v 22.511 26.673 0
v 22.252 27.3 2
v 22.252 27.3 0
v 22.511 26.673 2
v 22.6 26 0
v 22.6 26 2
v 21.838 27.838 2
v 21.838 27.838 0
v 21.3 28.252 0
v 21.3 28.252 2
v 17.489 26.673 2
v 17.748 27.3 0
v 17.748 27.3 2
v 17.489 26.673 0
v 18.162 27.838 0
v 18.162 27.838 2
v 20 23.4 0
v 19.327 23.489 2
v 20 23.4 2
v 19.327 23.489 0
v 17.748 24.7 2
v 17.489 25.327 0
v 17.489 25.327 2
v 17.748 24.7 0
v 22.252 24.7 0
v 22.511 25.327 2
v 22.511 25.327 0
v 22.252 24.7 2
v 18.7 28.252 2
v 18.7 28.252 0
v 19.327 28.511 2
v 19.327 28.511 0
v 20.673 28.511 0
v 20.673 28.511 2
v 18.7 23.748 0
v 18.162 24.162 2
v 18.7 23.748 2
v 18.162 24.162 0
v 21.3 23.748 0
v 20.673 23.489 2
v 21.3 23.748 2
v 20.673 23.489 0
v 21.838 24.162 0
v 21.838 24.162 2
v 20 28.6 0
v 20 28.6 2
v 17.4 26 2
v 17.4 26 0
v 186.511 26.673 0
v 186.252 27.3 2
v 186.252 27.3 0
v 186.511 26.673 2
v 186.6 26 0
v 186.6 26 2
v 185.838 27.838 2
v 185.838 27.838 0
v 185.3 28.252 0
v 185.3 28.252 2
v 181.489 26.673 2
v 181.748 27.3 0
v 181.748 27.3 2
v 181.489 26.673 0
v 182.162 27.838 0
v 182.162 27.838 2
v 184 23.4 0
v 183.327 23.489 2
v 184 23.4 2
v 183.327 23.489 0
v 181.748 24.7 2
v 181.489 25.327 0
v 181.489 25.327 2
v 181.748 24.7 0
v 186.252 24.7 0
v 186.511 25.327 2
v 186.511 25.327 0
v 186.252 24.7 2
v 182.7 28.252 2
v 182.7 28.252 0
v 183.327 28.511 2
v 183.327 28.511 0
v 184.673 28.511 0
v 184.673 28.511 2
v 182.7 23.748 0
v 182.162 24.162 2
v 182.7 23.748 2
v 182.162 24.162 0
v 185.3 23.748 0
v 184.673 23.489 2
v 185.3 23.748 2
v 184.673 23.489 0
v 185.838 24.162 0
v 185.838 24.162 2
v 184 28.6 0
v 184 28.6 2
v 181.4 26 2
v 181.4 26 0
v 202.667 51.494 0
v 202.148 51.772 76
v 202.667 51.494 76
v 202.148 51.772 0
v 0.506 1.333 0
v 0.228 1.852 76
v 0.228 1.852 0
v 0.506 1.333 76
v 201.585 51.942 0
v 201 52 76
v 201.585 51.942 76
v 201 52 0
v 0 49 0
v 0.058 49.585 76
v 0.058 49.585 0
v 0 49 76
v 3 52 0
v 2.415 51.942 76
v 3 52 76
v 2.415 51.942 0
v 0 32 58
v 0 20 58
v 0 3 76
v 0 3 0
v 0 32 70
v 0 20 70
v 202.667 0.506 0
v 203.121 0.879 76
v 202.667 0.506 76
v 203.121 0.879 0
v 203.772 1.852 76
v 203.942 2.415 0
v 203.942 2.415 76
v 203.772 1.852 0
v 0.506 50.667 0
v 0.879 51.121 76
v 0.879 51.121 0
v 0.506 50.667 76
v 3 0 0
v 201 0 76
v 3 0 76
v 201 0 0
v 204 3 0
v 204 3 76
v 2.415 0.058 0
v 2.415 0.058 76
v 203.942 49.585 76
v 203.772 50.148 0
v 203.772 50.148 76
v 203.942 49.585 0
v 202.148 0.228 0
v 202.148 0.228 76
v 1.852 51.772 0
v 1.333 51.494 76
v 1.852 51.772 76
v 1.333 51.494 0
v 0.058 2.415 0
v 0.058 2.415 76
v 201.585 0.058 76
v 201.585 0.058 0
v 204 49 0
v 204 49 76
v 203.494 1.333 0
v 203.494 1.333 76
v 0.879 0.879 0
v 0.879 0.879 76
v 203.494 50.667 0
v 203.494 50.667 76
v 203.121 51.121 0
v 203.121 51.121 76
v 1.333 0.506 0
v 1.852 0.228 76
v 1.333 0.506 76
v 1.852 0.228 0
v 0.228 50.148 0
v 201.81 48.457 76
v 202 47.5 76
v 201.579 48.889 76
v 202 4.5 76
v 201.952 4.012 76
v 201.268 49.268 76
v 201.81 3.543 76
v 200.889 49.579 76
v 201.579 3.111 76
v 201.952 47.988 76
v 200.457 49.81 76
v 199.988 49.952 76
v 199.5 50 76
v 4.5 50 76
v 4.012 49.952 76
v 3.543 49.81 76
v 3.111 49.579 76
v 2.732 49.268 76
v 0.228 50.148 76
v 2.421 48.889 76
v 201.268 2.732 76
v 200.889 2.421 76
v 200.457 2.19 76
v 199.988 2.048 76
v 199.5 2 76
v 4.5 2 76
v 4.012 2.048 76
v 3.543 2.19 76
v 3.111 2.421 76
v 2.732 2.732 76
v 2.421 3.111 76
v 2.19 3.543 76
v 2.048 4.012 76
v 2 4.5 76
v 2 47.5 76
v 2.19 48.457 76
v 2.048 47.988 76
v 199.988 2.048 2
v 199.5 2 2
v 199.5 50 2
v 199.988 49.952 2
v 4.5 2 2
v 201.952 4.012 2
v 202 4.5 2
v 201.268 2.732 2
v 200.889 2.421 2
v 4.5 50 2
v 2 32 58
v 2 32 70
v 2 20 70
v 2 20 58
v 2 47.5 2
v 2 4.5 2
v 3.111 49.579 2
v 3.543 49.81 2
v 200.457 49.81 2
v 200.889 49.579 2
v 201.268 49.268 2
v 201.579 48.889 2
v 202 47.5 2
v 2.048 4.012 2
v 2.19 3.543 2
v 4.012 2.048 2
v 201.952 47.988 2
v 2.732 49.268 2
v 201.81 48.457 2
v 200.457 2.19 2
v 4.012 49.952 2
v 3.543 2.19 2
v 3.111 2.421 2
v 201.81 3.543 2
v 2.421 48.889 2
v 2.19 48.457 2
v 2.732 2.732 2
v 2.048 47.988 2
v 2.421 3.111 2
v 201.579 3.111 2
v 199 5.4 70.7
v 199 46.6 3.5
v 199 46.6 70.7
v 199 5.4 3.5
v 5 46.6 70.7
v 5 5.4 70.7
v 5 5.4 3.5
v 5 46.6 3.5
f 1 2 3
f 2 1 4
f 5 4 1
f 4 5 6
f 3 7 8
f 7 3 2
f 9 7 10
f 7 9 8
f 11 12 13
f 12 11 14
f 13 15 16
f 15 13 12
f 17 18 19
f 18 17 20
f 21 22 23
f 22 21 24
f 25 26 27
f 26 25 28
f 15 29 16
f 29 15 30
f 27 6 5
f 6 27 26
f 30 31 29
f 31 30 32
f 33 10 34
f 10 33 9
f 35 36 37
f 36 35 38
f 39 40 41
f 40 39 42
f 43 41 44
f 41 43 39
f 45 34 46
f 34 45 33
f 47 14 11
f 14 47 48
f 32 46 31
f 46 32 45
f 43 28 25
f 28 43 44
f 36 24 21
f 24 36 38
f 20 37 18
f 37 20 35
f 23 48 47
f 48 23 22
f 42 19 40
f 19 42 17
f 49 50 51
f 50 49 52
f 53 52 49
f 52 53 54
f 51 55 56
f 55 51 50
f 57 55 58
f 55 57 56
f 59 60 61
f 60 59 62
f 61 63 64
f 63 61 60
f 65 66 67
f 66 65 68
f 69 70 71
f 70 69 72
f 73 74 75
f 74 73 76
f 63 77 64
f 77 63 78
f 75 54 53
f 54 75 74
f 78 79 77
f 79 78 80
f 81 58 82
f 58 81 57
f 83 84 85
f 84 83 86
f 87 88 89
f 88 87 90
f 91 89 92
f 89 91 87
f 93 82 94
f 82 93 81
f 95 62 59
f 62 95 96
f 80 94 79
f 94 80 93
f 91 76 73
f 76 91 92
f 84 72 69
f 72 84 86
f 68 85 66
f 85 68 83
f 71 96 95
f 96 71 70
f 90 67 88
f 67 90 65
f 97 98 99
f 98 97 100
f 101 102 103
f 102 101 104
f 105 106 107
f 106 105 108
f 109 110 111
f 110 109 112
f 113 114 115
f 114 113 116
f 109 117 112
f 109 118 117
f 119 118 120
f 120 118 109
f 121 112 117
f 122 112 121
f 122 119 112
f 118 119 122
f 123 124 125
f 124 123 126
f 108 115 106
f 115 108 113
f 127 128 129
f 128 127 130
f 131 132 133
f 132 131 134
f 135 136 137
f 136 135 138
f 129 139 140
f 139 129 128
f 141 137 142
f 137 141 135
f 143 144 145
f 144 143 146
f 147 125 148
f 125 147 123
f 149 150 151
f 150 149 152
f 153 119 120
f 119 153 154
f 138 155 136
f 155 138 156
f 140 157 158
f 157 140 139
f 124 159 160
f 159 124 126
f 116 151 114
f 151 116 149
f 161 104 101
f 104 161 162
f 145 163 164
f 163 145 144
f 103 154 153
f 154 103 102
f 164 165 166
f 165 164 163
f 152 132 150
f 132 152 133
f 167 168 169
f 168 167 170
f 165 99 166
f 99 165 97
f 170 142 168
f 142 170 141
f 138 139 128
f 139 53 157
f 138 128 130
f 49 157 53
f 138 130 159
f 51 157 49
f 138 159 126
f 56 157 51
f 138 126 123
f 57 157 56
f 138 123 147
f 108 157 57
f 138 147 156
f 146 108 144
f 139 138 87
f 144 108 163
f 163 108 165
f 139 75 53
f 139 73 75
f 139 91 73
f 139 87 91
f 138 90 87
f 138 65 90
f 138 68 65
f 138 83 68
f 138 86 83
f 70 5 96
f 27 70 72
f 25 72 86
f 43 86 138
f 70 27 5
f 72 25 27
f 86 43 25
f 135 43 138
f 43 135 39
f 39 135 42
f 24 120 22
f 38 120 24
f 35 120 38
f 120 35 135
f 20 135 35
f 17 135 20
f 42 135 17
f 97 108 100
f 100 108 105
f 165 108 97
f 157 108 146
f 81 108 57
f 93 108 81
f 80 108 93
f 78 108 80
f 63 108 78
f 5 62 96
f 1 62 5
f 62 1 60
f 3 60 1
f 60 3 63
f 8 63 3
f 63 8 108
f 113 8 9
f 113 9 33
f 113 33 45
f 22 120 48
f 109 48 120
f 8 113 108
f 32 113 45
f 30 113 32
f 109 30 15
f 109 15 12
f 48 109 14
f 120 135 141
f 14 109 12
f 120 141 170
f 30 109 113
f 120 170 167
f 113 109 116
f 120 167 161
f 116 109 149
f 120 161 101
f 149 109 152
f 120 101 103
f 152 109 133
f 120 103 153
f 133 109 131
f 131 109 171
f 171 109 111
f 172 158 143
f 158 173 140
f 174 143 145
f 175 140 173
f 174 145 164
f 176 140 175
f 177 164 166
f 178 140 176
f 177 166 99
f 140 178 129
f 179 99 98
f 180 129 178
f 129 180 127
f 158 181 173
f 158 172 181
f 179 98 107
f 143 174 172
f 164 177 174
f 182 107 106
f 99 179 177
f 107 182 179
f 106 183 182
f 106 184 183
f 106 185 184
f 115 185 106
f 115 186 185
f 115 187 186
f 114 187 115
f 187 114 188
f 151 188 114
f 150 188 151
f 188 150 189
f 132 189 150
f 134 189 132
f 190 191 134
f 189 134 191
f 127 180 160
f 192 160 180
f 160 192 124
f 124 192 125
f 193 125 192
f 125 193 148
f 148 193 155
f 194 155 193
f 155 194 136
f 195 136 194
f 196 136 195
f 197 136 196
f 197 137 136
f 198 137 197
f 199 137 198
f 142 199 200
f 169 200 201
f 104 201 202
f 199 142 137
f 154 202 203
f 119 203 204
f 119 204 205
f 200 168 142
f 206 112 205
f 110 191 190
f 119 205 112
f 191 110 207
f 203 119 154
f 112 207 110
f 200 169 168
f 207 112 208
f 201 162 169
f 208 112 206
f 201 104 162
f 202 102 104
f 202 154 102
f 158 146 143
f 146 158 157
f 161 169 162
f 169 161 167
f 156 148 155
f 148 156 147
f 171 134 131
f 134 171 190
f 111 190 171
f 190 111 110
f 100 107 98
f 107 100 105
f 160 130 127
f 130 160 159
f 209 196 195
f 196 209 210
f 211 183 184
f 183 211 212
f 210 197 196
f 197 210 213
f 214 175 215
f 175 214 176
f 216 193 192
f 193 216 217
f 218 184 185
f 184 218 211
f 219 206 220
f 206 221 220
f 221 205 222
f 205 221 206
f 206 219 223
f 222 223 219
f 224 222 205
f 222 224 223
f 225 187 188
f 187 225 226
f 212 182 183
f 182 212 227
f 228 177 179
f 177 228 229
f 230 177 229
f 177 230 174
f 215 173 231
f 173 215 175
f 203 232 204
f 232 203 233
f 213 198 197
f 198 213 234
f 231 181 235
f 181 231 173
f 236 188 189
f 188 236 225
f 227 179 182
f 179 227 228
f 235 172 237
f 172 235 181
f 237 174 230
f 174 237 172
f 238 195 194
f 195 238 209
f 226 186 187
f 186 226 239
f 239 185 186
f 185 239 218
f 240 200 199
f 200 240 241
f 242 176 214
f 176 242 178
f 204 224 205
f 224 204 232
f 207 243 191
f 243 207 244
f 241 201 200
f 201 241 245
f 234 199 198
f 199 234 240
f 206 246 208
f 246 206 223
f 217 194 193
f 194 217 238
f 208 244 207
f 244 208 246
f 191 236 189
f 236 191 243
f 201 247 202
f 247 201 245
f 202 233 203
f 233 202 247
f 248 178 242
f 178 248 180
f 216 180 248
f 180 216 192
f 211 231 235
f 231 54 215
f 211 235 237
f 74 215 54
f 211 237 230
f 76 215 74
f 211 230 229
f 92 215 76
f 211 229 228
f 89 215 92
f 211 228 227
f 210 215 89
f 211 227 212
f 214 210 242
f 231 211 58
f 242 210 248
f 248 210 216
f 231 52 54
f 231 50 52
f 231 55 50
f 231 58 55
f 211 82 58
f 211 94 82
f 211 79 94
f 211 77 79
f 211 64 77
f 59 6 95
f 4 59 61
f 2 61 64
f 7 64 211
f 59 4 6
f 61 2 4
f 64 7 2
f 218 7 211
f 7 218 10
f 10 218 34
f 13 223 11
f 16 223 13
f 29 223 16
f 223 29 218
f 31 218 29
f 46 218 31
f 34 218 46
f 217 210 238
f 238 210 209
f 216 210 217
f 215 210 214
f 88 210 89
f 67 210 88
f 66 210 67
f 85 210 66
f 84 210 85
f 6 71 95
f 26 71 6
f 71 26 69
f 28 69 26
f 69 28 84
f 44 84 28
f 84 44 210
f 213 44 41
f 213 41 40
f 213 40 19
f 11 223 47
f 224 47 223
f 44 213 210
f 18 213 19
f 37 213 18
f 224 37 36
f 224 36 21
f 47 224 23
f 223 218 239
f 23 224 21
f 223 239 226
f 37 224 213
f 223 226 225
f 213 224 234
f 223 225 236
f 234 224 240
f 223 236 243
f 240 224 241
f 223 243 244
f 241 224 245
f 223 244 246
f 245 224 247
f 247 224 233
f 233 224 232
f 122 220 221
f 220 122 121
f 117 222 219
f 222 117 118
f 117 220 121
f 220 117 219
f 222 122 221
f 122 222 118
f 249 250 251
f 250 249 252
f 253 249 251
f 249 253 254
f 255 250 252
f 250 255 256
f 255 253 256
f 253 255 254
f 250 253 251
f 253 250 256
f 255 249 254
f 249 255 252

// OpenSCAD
// Perfect Roadster — single 10S2P module tray
// Units: millimeters
// Open in OpenSCAD or any SCAD-compatible tool; also documents dims for fab.

/* [Module / cells] */
cell_d = 18.6;
cell_h = 65.2;
// 10S2P brick footprint (2 parallel × 10 series along length)
brick_l = 10 * cell_d + 8; // ~194 + wrap margin handled below
brick_w = 2 * cell_d + 4;  // ~41.2
brick_h = cell_h + 2;

/* [Tray outer — matches docs/00 envelope] */
tray_l = 204;
tray_w = 52;
tray_h = 76;
wall = 2.0;
corner_r = 3;

/* [Clearance / foam] */
foam = 1.5;

module rounded_box(l, w, h, r) {
  hull() {
    for (x = [r, l - r])
      for (y = [r, w - r])
        translate([x, y, 0])
          cylinder(h = h, r = r, $fn = 32);
  }
}

module tray() {
  difference() {
    rounded_box(tray_l, tray_w, tray_h, corner_r);
    // inner cavity
    translate([wall, wall, wall])
      rounded_box(tray_l - 2 * wall, tray_w - 2 * wall, tray_h - wall + 0.1, corner_r - 0.5);
    // wire exit (BB end)
    translate([-0.1, tray_w / 2 - 6, tray_h - 18])
      cube([wall + 2, 12, 12]);
    // retention bolt holes (M5)
    for (x = [20, tray_l - 20])
      translate([x, tray_w / 2, -0.1])
        cylinder(h = wall + 1, d = 5.2, $fn = 24);
  }
}

module cell_brick_ghost() {
  color([0.2, 0.7, 0.3, 0.35])
    translate([
      (tray_l - brick_l) / 2,
      (tray_w - brick_w) / 2,
      wall + foam
    ])
      cube([brick_l, brick_w, brick_h]);
}

tray();
cell_brick_ghost();

echo("tray_outer_mm", tray_l, tray_w, tray_h);
echo("brick_approx_mm", brick_l, brick_w, brick_h);
echo("inner_clear_mm", tray_l - 2 * wall, tray_w - 2 * wall, tray_h - wall);
